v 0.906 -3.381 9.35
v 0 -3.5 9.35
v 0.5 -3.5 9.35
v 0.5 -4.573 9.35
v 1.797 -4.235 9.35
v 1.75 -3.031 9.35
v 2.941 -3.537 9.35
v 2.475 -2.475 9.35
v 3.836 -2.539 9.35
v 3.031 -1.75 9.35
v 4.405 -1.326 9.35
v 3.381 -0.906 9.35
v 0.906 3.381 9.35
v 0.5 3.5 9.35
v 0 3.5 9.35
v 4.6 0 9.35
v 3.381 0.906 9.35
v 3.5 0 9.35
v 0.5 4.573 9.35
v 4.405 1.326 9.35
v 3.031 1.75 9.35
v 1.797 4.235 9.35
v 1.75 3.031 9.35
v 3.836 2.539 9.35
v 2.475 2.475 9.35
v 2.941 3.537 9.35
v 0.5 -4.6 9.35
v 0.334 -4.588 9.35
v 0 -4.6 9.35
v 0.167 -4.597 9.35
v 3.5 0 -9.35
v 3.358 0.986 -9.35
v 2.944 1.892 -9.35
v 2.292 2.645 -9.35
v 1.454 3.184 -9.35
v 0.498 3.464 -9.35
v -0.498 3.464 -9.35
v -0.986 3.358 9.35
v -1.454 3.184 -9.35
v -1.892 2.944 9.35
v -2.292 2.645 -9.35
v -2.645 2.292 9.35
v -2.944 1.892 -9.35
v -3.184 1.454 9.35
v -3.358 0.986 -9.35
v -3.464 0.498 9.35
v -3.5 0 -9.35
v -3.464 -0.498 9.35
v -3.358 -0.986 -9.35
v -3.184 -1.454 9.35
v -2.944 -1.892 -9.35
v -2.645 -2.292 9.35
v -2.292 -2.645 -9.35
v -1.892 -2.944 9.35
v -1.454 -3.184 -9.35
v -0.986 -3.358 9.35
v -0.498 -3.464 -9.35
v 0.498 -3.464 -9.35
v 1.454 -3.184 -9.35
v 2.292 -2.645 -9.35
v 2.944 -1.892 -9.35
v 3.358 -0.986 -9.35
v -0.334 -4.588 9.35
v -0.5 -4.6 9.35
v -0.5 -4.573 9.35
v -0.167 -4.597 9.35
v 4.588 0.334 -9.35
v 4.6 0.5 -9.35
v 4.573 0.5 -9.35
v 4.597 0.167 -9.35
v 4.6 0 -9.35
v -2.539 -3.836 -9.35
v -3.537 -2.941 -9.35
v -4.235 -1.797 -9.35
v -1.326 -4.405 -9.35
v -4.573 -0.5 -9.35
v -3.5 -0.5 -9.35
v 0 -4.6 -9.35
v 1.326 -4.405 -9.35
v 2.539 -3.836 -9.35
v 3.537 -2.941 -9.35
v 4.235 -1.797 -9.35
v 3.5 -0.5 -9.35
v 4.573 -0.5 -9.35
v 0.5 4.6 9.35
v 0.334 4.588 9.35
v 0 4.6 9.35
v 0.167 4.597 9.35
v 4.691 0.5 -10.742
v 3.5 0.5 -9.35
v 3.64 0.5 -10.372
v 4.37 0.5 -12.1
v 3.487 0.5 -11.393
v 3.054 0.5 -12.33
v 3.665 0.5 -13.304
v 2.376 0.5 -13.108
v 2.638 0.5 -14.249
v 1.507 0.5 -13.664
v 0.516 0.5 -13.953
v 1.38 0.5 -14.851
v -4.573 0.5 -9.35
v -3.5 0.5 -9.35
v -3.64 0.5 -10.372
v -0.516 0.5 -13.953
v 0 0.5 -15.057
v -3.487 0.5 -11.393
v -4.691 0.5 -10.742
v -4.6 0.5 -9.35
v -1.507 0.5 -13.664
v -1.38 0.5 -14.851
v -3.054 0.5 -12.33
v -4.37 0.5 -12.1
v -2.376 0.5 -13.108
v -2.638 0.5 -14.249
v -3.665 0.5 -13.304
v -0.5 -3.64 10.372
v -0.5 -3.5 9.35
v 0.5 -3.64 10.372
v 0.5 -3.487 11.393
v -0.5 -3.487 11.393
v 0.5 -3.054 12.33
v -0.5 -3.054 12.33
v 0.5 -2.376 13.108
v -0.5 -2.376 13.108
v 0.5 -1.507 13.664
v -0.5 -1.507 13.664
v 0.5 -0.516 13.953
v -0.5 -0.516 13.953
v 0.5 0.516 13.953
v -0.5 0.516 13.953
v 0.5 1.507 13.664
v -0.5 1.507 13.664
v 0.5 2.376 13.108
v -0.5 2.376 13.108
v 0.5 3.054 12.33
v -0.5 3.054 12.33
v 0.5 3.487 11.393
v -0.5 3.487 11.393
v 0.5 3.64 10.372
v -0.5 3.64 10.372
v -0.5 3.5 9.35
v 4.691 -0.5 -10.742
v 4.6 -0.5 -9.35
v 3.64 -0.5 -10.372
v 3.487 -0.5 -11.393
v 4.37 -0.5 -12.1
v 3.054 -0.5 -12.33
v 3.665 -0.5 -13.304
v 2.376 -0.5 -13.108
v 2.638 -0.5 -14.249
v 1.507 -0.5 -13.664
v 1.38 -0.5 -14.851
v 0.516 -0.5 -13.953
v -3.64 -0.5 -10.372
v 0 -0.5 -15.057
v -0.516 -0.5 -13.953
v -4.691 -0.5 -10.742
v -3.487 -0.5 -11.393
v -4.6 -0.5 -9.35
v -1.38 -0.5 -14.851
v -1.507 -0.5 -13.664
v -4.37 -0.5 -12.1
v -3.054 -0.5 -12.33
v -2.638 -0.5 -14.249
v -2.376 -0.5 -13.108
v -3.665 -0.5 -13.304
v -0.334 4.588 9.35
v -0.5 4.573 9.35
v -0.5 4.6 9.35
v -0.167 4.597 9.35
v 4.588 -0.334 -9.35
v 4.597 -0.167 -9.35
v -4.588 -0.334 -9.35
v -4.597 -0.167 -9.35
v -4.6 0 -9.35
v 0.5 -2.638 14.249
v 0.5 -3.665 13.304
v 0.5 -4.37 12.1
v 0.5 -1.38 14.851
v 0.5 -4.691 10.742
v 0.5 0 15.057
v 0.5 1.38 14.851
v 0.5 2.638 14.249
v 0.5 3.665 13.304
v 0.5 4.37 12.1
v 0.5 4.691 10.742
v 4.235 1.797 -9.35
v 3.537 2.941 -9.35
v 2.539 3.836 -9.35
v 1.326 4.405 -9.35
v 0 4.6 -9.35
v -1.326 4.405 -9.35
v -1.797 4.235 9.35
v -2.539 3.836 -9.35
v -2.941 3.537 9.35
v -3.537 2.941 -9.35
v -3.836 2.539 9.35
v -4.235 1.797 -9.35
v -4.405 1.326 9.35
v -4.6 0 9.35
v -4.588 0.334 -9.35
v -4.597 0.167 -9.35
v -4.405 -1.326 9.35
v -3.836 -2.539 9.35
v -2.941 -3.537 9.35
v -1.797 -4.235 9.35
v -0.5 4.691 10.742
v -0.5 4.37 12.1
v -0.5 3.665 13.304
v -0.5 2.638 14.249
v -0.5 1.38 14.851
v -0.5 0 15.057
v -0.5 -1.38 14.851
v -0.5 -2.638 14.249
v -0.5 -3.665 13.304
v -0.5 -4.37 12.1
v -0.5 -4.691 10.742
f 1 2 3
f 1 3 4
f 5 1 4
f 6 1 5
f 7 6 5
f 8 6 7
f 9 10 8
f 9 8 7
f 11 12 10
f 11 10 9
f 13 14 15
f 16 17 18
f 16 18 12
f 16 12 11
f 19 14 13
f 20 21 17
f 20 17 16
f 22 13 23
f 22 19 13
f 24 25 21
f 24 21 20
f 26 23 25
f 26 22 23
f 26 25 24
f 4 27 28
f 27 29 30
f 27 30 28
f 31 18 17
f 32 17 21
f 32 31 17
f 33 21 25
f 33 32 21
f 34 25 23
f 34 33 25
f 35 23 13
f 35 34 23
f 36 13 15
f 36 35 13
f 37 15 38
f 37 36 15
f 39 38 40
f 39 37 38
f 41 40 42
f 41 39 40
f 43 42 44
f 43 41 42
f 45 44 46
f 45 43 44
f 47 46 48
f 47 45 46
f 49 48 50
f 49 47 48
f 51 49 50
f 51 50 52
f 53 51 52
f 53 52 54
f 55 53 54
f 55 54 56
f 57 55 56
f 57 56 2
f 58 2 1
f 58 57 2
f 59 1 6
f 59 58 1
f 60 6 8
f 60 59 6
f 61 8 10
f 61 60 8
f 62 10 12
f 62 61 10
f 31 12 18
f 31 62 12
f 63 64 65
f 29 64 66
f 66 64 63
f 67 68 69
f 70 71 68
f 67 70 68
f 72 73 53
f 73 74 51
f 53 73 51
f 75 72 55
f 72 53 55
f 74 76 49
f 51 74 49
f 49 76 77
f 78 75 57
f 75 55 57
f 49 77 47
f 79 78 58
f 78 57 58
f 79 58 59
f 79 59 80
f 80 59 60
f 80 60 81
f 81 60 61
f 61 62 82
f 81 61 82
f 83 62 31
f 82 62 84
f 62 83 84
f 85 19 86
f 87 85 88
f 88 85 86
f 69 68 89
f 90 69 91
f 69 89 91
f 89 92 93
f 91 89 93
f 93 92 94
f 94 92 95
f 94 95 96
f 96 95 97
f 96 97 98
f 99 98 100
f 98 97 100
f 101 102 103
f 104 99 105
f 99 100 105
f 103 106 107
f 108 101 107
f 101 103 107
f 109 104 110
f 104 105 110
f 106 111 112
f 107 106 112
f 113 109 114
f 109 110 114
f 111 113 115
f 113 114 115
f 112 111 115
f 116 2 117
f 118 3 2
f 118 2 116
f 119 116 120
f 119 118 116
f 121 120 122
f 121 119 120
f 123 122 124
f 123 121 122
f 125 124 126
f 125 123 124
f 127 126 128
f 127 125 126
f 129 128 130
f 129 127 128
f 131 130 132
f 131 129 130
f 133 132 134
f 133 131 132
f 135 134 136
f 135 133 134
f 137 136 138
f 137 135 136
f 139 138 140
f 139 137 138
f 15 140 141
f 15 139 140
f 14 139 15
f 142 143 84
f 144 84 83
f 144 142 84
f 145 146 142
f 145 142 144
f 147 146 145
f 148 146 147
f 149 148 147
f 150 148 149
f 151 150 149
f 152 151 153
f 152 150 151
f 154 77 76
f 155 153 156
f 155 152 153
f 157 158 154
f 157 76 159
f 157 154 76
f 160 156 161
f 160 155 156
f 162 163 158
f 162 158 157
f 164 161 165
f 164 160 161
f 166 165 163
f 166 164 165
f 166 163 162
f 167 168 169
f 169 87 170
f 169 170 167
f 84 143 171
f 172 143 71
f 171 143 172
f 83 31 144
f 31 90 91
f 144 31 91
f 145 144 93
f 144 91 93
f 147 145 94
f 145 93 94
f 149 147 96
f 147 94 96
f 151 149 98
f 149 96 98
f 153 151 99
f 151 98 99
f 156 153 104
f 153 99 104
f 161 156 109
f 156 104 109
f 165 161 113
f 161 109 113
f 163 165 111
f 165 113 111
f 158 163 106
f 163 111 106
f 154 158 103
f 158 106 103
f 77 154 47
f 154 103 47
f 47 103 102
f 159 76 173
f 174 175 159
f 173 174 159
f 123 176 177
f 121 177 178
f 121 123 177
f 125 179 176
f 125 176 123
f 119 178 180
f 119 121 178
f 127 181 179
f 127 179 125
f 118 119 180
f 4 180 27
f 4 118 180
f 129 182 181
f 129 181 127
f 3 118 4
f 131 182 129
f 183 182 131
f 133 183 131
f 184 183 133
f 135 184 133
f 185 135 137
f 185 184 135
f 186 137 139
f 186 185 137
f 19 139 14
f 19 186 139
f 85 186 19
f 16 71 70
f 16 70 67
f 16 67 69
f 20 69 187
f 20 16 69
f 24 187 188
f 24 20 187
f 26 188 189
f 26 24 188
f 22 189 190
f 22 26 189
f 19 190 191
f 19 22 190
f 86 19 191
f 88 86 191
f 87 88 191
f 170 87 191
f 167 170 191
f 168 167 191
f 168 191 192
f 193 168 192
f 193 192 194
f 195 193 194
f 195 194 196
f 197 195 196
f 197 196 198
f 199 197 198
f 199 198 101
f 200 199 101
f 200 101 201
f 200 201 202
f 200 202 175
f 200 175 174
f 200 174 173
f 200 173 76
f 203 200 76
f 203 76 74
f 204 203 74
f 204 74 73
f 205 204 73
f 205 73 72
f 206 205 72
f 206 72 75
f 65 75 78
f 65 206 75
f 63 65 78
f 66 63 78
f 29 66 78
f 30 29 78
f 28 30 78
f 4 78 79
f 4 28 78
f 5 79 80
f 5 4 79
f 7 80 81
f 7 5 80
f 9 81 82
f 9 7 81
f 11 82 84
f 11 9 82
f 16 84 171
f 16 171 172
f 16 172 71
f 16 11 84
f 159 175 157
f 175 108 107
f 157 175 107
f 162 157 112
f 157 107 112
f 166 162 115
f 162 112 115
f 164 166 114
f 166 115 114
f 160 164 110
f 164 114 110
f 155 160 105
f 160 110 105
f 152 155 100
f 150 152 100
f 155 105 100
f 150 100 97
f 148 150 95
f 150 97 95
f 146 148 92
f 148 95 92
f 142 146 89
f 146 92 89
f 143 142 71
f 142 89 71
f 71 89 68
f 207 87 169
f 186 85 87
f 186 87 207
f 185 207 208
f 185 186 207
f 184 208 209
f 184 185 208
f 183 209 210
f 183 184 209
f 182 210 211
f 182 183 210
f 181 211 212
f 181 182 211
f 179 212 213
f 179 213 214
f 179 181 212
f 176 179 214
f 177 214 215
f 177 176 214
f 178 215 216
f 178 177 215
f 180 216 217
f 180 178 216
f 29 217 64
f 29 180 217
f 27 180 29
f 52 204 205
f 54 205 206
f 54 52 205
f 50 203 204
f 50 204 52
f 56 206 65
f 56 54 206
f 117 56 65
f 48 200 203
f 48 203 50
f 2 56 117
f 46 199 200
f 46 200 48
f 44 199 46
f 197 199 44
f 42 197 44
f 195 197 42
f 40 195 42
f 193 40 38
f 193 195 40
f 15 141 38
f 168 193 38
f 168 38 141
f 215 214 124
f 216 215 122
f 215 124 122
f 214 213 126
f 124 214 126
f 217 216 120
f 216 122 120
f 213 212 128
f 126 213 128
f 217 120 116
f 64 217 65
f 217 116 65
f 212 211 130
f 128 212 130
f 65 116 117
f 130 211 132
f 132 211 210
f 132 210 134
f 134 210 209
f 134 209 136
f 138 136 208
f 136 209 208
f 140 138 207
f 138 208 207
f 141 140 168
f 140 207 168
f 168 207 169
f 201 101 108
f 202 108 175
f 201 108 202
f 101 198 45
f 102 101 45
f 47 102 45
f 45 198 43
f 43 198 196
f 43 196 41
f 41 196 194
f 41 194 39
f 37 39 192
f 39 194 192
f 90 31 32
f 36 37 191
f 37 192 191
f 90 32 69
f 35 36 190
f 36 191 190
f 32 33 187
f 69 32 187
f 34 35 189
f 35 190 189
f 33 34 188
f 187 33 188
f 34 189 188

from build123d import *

# Parameters (mm, degrees)
SKETCH1_R           = 4.6
SKETCH1_R_2         = 3.5
BOSS_EXTRUDE1_DEPTH = 9.35
BOSS_EXTRUDE2_DEPTH = 0.5
BOSS_EXTRUDE3_DEPTH = 0.5


with BuildPart() as part:
    # Sketch1 → Boss-Extrude1 (new, symmetric)
    with BuildSketch(Plane.XY):
        Circle(SKETCH1_R)
        Circle(SKETCH1_R_2, mode=Mode.SUBTRACT)
    extrude(amount=BOSS_EXTRUDE1_DEPTH, both=True)

    # Sketch2 → Boss-Extrude2 (add, symmetric)
    with BuildSketch(Plane(origin=(0, 0, 0), x_dir=(0, 0, -1), z_dir=(1, 0, 0))):
        with BuildLine():
            Line((-9.35, -4.6), (-9.35, -3.5))
            ThreePointArc((-9.35, -3.5), (-13.990054945, 0), (-9.35, 3.5))
            Line((-9.35, 3.5), (-9.35, 4.6))
            ThreePointArc((-9.35, 4.6), (-15.057440918, 0), (-9.35, -4.6))
        make_face()
    extrude(amount=BOSS_EXTRUDE2_DEPTH, both=True)

    # Sketch4 → Boss-Extrude3 (add, symmetric)
    with BuildSketch(Plane(origin=(0, 0, 0), x_dir=(1, 0, 0), z_dir=(0, 1, 0))):
        with BuildLine():
            Line((4.6, 9.35), (3.5, 9.35))
            ThreePointArc((3.5, 9.35), (0, 13.990054945), (-3.5, 9.35))
            Line((-3.5, 9.35), (-4.6, 9.35))
            ThreePointArc((-4.6, 9.35), (0, 15.057440918), (4.6, 9.35))
        make_face()
    extrude(amount=BOSS_EXTRUDE3_DEPTH, both=True)


solid = part.part
